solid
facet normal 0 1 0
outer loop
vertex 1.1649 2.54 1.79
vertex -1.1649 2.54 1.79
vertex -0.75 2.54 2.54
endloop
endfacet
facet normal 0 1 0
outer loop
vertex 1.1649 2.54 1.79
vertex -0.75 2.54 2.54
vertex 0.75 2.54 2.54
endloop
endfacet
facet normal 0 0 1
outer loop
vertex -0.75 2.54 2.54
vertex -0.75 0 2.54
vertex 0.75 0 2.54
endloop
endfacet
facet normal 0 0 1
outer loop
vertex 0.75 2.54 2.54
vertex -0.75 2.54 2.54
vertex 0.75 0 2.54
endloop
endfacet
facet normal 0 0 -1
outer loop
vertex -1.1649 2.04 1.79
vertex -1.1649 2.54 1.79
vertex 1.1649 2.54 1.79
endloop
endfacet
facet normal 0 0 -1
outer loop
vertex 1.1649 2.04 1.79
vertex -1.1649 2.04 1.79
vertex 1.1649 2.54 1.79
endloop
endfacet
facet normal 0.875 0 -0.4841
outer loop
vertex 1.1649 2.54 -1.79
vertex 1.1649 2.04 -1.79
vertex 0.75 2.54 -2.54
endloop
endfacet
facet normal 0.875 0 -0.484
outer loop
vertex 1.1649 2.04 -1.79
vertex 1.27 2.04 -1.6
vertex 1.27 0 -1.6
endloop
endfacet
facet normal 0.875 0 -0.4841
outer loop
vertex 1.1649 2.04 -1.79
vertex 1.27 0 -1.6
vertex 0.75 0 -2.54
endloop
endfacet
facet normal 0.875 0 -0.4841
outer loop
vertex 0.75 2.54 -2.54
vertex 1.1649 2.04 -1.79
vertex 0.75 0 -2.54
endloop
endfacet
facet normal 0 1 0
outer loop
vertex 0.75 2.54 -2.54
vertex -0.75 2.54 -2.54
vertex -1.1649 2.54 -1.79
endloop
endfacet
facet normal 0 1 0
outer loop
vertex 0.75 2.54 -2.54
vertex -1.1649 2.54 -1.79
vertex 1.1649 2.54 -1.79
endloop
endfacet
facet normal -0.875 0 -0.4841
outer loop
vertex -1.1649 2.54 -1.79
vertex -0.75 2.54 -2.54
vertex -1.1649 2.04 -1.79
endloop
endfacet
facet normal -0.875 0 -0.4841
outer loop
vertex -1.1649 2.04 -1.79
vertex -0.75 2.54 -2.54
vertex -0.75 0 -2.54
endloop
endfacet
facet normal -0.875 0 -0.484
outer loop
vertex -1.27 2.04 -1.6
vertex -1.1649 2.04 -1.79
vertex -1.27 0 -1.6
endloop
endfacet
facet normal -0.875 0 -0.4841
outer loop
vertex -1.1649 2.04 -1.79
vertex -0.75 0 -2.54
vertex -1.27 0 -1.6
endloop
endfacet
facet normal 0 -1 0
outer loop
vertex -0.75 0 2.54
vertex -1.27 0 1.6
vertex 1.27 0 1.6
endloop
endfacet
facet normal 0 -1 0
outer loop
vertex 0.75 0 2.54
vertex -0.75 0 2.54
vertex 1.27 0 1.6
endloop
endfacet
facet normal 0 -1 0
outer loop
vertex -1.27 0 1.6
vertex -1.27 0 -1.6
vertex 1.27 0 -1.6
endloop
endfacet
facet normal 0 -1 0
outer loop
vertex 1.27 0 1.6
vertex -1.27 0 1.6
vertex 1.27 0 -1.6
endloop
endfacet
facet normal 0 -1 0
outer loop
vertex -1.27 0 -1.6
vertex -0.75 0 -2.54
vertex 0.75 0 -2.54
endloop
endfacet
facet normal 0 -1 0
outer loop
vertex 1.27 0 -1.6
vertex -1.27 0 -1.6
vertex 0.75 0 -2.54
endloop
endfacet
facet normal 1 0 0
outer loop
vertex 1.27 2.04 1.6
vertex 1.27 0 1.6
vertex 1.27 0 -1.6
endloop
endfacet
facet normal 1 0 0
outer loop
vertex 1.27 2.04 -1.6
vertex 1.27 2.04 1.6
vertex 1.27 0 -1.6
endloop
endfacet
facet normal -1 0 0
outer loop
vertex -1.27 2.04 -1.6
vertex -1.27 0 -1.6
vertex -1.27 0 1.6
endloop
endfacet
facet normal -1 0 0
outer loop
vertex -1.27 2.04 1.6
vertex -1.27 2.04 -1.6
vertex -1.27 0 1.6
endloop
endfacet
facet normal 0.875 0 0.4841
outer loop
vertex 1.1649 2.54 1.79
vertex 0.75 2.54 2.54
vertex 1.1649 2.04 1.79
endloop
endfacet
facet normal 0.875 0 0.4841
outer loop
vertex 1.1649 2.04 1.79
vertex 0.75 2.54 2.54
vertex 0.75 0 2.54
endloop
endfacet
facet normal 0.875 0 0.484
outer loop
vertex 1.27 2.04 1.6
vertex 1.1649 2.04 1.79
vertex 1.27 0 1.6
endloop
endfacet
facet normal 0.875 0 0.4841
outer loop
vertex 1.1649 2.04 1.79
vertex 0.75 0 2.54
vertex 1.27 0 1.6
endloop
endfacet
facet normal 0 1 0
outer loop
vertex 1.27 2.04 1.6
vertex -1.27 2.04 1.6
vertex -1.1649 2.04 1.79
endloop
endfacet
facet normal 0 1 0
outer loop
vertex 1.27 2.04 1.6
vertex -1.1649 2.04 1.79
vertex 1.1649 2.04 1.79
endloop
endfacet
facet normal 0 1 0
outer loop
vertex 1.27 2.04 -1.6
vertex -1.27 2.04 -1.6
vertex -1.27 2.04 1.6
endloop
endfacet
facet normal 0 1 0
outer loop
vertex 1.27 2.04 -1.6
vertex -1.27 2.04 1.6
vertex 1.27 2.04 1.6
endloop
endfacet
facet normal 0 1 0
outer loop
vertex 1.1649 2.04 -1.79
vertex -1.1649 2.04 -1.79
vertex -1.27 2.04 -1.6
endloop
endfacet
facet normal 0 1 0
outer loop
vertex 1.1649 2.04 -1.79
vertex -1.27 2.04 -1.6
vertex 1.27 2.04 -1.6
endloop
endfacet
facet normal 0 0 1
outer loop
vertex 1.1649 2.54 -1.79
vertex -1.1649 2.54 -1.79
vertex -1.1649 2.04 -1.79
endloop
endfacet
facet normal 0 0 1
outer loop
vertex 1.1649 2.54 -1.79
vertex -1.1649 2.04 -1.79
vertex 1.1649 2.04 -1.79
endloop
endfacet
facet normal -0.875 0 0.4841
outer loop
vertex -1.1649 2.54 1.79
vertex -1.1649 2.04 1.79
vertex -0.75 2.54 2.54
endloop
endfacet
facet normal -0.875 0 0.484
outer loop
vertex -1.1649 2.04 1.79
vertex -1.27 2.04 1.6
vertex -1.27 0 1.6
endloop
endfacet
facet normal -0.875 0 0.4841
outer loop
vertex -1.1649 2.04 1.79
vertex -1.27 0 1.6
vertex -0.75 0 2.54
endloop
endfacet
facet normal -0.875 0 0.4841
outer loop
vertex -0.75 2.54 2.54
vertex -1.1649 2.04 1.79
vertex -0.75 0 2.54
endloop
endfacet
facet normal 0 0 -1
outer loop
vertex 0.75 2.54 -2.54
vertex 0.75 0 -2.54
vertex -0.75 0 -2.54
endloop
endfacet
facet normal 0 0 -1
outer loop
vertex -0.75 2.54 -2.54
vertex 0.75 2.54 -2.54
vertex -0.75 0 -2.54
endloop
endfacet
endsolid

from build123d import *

# Parameters (mm, degrees)
EXTRUDE_1_DEPTH     = 2.54
SKETCH_2_W          = 2.54
SKETCH_2_H          = 3.58
CUT_EXTRUDE_1_DEPTH = 0.5


with BuildPart() as part:
    # Эскиз1 → Бобышка-Вытянуть1 (new body)
    with BuildSketch(Plane(origin=(0, 0, 0), x_dir=(1, 0, 0), z_dir=(0, 1, 0))):
        Polygon((-0.75, 2.54), (-1.27, 1.6), (-1.27, -1.6), (-0.75, -2.54), (0.75, -2.54), (1.27, -1.6), (1.27, 1.6), (0.75, 2.54), align=None)
    extrude(amount=EXTRUDE_1_DEPTH)

    # Эскиз2 → Вырез-Вытянуть1 (cut)
    with BuildSketch(Plane(origin=(0, 2.54, 0), x_dir=(1, 0, 0), z_dir=(0, 1, 0))):
        Rectangle(SKETCH_2_W, SKETCH_2_H)
    extrude(amount=-CUT_EXTRUDE_1_DEPTH, mode=Mode.SUBTRACT)


solid = part.part
